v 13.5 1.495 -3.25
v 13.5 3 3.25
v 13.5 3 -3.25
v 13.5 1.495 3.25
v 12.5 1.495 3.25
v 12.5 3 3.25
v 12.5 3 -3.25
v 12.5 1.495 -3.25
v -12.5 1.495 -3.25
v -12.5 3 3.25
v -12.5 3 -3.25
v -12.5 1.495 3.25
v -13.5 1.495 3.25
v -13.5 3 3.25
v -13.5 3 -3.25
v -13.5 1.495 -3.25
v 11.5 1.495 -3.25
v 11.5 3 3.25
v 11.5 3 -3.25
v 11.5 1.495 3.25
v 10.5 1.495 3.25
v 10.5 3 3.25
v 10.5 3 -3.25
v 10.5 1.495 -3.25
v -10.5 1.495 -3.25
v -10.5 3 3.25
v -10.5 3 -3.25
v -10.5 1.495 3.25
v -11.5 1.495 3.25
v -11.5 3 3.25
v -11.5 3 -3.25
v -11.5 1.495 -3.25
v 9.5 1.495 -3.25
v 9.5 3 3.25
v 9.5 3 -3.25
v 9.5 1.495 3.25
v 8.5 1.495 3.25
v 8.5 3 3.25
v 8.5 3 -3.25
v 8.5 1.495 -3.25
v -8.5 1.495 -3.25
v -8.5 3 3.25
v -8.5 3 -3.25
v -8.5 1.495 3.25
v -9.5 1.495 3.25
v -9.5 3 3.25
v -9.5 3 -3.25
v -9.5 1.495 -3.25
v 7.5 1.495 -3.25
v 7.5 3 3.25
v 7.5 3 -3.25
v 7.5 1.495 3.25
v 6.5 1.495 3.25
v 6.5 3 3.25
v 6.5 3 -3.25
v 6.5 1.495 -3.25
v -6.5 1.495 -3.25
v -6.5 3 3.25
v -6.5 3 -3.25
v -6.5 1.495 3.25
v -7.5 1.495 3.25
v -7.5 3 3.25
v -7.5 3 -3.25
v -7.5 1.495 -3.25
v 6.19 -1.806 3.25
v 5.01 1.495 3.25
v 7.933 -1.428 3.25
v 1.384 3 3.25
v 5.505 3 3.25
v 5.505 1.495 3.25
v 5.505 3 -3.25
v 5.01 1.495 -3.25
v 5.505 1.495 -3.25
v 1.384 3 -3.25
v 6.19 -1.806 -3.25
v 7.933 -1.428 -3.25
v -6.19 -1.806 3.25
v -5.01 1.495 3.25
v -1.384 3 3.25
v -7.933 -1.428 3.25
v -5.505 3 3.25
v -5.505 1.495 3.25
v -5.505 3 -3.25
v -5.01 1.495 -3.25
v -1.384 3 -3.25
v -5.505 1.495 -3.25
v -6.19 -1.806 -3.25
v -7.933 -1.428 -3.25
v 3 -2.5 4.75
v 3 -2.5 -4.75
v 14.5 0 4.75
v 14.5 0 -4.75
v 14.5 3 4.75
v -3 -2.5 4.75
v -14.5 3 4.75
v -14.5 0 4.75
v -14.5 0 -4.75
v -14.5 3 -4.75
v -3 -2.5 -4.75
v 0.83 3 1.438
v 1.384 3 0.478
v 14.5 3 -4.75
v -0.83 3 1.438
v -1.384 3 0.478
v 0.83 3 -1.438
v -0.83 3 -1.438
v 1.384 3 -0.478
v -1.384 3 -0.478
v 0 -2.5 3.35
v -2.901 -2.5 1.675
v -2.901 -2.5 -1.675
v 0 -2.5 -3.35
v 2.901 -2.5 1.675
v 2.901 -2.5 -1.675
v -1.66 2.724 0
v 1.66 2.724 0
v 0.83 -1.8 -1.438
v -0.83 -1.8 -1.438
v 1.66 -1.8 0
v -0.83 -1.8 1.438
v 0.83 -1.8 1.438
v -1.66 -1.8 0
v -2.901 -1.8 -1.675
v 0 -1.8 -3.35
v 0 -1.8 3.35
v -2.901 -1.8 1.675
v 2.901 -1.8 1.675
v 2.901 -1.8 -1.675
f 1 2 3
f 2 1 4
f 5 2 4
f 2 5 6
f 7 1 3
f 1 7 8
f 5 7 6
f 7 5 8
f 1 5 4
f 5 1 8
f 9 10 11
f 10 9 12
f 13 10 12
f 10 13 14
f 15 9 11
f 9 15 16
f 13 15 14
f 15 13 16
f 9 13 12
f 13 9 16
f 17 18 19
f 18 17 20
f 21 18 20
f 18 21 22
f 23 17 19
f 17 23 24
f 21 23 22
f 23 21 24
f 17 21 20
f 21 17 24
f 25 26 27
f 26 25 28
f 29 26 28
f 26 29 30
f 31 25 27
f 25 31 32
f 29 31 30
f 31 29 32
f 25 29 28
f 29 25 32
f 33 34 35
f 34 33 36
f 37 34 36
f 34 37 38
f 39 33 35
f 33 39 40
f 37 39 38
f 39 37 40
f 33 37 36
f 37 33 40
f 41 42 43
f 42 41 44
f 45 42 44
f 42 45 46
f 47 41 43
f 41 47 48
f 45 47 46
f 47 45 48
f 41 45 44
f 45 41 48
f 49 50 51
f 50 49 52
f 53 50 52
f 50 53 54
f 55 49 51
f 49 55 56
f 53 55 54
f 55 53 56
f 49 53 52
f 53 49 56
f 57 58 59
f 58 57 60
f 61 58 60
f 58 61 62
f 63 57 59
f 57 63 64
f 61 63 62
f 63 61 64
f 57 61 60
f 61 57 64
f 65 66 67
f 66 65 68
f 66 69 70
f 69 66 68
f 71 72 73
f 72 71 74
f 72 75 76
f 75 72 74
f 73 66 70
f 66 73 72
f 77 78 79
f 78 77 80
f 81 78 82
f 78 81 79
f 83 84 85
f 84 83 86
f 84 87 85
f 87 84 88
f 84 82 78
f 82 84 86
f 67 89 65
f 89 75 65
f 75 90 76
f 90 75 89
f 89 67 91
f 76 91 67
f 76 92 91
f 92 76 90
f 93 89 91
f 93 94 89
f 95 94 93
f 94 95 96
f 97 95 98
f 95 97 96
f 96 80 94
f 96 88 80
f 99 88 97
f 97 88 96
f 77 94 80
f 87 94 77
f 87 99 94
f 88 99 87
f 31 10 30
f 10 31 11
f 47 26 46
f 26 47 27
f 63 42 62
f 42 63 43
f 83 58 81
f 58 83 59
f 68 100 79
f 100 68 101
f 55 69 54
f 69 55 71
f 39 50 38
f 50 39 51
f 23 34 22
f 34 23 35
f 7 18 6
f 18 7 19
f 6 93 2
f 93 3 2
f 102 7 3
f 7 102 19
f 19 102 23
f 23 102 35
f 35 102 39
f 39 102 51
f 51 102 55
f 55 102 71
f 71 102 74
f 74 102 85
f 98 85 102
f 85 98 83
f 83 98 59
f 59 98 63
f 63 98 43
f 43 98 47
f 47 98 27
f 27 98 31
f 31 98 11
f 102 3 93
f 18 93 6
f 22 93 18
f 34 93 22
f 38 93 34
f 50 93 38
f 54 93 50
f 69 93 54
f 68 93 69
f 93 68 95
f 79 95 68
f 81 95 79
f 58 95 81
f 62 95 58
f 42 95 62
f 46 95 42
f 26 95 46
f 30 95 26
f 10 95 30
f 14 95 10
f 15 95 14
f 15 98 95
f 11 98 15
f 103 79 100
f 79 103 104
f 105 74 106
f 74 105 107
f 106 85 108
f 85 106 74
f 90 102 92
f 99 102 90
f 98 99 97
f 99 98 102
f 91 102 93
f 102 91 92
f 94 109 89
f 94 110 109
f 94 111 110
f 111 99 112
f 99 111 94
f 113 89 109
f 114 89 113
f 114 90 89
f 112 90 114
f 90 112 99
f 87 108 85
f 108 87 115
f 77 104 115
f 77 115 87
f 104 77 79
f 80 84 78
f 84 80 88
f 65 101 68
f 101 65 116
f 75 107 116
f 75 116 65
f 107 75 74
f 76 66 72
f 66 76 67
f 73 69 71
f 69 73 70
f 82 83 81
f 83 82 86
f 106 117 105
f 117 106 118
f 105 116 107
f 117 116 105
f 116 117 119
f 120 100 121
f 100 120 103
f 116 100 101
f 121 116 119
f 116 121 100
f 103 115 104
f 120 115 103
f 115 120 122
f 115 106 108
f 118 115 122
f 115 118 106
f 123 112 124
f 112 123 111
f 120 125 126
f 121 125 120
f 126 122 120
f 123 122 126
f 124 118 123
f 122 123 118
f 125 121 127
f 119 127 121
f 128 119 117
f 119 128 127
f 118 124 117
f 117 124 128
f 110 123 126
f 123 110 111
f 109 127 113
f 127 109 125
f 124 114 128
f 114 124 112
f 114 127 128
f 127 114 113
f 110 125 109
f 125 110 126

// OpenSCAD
// [FL_INDEX: keywords="openscad, 3d_parametric, Tough_Belt_Clip, csg_solid" | COT="Parametric OpenSCAD design from 3DCodeverse"]
// Title: Tough Belt Clip

// Tough Belt Clip
// Design by Marius Gheorghescu, December 2013


// how many teeth on each side
teeth = 5;

// width of the belt in mm incl clearance (use 6.25 for typical GT2 belt)
belt_width = 6.5;

// thickness of the belt in mm (use 1.5 for GT2 belt)
belt_thickness = 1.5;

// belt pitch in mm (use 2.0 for GT2 belt)
pitch = 2.0;

// this controls the strength of the bracket 
shell = 1.5;

/* [Hidden] */
cutout_width = 6 + belt_thickness + shell;
len = 2*teeth*pitch + cutout_width;
round_corner_epsilon = 1;
epsilon = 0.01;


module belt()
{
	// reinforcement
	//cube([len, 2, h], center=true);

	for(i=[pitch/4:pitch:len]) {
		translate([i-len/2, 1.25, 0])
			cube([pitch - round_corner_epsilon, belt_thickness + round_corner_epsilon, belt_width], center=true);

	}

}



module clip() {
difference()  {

	union() {
		// general shape of the clip
		linear_extrude(belt_width + 2*shell, center=true) {
			polygon(points=[
				[len/2,0],
				[3,-2.5], 
				[-3,-2.5], 
				[-len/2,0], 
				[-len/2, shell + belt_thickness], 
				[len/2, shell + belt_thickness]
			]);
		}


		
	}

	// left belt turn
	rotate([0,0,-45])
	translate([-3.2/2 - shell - belt_thickness/2,0,0])
		cube([belt_thickness, 20 + 2*shell, belt_width], center=true);

	// right belt turn
	rotate([0,0,45])
//+ belt_thicknes/2 + shell
	translate([3.2/2 + shell + belt_thickness/2,0,0])
		cube([belt_thickness, 20 + 2*shell, belt_width], center=true);

	// cutouts
	translate([len/2 - teeth*pitch, shell + belt_thickness/2, 0])
		cube([pitch + epsilon, belt_thickness + epsilon, belt_width], center=true);

	translate([-len/2 + teeth*pitch, shell + belt_thickness/2, 0])
		cube([pitch + epsilon, belt_thickness + epsilon, belt_width], center=true);


	// m3 hole
	rotate([90,0,0])
		cylinder(r=1.66, h=10 + 2*shell, center=true);

	// hex nut
	translate([0, -3.8, 0])
	rotate([90,90,0])
		cylinder(r=3.35, h=4, center=true, $fn=6);

	// belt teeth
	for(i=[1:1:teeth]) {

		// left side
		color([1,0, 0])
		translate([len/2 + pitch/4 - i*pitch, shell + belt_thickness/2, 0])
			cube([pitch/2, belt_thickness + epsilon, belt_width], center=true);

		// right side 
		color([1,0, 0])
		translate([-len/2 - pitch/4 + i*pitch, shell + belt_thickness/2, 0])
			cube([pitch/2, belt_thickness + epsilon, belt_width], center=true);
	}

}


}


module clip_set()
{
	for(i=[0:10:50]) {
		translate([0,i,0])
			clip();
	}
}

//clip_set();
clip();
